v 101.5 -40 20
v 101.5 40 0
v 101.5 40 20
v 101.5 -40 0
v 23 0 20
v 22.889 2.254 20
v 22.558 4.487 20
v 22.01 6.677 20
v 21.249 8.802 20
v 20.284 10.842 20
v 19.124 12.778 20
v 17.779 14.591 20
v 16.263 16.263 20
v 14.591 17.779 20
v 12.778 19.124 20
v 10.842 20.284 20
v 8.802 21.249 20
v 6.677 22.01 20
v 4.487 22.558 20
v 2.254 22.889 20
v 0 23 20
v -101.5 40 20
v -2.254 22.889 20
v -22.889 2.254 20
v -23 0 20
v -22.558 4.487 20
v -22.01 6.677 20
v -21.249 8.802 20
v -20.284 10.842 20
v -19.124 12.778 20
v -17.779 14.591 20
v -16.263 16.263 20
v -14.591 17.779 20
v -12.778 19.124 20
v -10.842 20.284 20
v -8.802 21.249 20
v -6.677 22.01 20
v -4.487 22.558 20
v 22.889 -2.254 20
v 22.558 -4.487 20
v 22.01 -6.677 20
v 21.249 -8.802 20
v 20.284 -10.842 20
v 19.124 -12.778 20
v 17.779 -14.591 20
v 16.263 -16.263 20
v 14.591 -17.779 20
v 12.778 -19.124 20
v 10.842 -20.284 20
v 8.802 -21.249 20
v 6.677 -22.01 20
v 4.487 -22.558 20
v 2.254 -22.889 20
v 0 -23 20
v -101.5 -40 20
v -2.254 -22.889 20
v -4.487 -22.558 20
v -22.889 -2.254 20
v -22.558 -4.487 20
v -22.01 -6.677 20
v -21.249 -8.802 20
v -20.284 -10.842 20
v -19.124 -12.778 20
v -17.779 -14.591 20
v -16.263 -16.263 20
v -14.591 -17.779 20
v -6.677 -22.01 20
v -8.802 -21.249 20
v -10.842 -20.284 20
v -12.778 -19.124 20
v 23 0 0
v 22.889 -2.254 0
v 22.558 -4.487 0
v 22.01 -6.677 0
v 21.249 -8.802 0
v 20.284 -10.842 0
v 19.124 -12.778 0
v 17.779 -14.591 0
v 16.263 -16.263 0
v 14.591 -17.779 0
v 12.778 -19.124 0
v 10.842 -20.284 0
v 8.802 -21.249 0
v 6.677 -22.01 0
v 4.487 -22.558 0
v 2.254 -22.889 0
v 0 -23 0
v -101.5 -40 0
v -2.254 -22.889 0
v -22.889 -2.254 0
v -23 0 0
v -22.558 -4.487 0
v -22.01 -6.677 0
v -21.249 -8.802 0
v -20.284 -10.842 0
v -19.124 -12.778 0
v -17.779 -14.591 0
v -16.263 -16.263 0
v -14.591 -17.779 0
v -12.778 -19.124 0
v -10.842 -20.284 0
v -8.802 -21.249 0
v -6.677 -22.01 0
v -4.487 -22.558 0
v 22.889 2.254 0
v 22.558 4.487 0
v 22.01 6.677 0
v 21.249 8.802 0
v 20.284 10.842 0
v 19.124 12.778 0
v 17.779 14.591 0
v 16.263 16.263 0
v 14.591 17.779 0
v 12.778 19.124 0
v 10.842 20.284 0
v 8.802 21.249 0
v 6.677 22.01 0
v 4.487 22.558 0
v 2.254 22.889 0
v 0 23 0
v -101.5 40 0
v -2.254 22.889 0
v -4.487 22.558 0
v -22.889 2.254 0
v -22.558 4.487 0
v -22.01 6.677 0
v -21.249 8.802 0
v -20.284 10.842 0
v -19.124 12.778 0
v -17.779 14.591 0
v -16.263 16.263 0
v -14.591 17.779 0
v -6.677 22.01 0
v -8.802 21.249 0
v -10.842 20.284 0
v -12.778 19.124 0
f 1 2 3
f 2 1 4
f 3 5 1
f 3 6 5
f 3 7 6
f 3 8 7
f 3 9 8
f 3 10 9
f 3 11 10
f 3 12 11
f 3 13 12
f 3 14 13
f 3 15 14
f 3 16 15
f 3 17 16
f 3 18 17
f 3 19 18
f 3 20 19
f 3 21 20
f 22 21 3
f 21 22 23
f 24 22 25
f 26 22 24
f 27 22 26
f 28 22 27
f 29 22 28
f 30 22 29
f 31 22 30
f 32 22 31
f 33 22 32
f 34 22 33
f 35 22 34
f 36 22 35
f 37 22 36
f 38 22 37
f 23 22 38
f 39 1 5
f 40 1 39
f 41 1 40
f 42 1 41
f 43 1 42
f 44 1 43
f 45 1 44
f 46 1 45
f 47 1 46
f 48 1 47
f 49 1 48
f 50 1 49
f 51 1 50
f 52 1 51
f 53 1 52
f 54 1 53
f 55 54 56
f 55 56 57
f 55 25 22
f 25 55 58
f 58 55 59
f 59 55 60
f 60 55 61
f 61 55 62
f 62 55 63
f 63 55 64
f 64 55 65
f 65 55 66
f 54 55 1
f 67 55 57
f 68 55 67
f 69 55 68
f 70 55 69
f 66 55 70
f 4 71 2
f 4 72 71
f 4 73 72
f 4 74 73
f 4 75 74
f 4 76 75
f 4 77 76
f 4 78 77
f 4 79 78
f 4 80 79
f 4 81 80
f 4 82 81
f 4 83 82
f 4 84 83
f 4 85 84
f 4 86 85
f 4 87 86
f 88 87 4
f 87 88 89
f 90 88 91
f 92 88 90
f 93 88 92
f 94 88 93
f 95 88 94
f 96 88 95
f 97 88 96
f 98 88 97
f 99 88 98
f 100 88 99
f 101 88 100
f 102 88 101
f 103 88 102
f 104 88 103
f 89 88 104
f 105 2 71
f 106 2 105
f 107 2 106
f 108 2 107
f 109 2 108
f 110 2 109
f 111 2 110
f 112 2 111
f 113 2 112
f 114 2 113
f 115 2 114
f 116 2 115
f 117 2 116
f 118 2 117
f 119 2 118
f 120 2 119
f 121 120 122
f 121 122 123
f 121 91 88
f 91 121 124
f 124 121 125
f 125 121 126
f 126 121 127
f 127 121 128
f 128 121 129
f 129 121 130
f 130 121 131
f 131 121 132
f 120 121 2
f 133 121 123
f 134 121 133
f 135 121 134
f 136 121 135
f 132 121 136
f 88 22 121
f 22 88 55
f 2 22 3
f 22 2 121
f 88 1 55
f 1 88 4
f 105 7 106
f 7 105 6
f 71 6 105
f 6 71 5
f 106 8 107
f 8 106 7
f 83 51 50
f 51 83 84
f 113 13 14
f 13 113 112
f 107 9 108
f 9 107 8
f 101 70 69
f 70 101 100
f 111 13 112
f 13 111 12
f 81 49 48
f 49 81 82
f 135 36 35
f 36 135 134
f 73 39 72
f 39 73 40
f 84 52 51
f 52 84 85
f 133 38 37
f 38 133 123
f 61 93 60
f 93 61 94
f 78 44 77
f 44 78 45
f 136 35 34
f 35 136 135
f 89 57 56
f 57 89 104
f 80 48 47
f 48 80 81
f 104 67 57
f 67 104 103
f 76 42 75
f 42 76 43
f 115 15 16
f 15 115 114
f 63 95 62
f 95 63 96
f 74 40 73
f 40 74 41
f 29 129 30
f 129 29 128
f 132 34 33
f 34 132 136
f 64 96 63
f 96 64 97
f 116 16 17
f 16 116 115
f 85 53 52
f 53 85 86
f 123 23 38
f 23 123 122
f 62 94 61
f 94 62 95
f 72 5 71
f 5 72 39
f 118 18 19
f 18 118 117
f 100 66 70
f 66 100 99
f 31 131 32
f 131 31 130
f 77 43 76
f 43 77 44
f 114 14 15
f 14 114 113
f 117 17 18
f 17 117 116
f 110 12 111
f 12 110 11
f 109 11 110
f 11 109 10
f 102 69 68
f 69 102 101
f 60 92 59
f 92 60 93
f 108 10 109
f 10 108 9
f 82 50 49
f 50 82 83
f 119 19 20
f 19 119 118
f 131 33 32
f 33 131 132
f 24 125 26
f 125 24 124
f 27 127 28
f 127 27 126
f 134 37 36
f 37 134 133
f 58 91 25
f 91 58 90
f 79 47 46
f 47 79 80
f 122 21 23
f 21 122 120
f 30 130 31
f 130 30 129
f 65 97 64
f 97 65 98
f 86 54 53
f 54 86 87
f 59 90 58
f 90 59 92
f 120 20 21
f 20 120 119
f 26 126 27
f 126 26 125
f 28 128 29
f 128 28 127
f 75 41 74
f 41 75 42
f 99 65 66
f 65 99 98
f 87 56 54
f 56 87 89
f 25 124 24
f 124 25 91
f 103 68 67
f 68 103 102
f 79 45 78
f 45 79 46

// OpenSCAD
// Built by bench/smallmodels/features/compiler.py from a list of features.
$fn = 64;
difference() {
  union() {
    translate([0, 0, 0]) translate([-101.5, -40, 0]) cube([203, 80, 20]);
  }
  union() {
    translate([0, 0, -1]) rotate([0, 0, 0]) cylinder(d = 46, h = 22);
  }
}
